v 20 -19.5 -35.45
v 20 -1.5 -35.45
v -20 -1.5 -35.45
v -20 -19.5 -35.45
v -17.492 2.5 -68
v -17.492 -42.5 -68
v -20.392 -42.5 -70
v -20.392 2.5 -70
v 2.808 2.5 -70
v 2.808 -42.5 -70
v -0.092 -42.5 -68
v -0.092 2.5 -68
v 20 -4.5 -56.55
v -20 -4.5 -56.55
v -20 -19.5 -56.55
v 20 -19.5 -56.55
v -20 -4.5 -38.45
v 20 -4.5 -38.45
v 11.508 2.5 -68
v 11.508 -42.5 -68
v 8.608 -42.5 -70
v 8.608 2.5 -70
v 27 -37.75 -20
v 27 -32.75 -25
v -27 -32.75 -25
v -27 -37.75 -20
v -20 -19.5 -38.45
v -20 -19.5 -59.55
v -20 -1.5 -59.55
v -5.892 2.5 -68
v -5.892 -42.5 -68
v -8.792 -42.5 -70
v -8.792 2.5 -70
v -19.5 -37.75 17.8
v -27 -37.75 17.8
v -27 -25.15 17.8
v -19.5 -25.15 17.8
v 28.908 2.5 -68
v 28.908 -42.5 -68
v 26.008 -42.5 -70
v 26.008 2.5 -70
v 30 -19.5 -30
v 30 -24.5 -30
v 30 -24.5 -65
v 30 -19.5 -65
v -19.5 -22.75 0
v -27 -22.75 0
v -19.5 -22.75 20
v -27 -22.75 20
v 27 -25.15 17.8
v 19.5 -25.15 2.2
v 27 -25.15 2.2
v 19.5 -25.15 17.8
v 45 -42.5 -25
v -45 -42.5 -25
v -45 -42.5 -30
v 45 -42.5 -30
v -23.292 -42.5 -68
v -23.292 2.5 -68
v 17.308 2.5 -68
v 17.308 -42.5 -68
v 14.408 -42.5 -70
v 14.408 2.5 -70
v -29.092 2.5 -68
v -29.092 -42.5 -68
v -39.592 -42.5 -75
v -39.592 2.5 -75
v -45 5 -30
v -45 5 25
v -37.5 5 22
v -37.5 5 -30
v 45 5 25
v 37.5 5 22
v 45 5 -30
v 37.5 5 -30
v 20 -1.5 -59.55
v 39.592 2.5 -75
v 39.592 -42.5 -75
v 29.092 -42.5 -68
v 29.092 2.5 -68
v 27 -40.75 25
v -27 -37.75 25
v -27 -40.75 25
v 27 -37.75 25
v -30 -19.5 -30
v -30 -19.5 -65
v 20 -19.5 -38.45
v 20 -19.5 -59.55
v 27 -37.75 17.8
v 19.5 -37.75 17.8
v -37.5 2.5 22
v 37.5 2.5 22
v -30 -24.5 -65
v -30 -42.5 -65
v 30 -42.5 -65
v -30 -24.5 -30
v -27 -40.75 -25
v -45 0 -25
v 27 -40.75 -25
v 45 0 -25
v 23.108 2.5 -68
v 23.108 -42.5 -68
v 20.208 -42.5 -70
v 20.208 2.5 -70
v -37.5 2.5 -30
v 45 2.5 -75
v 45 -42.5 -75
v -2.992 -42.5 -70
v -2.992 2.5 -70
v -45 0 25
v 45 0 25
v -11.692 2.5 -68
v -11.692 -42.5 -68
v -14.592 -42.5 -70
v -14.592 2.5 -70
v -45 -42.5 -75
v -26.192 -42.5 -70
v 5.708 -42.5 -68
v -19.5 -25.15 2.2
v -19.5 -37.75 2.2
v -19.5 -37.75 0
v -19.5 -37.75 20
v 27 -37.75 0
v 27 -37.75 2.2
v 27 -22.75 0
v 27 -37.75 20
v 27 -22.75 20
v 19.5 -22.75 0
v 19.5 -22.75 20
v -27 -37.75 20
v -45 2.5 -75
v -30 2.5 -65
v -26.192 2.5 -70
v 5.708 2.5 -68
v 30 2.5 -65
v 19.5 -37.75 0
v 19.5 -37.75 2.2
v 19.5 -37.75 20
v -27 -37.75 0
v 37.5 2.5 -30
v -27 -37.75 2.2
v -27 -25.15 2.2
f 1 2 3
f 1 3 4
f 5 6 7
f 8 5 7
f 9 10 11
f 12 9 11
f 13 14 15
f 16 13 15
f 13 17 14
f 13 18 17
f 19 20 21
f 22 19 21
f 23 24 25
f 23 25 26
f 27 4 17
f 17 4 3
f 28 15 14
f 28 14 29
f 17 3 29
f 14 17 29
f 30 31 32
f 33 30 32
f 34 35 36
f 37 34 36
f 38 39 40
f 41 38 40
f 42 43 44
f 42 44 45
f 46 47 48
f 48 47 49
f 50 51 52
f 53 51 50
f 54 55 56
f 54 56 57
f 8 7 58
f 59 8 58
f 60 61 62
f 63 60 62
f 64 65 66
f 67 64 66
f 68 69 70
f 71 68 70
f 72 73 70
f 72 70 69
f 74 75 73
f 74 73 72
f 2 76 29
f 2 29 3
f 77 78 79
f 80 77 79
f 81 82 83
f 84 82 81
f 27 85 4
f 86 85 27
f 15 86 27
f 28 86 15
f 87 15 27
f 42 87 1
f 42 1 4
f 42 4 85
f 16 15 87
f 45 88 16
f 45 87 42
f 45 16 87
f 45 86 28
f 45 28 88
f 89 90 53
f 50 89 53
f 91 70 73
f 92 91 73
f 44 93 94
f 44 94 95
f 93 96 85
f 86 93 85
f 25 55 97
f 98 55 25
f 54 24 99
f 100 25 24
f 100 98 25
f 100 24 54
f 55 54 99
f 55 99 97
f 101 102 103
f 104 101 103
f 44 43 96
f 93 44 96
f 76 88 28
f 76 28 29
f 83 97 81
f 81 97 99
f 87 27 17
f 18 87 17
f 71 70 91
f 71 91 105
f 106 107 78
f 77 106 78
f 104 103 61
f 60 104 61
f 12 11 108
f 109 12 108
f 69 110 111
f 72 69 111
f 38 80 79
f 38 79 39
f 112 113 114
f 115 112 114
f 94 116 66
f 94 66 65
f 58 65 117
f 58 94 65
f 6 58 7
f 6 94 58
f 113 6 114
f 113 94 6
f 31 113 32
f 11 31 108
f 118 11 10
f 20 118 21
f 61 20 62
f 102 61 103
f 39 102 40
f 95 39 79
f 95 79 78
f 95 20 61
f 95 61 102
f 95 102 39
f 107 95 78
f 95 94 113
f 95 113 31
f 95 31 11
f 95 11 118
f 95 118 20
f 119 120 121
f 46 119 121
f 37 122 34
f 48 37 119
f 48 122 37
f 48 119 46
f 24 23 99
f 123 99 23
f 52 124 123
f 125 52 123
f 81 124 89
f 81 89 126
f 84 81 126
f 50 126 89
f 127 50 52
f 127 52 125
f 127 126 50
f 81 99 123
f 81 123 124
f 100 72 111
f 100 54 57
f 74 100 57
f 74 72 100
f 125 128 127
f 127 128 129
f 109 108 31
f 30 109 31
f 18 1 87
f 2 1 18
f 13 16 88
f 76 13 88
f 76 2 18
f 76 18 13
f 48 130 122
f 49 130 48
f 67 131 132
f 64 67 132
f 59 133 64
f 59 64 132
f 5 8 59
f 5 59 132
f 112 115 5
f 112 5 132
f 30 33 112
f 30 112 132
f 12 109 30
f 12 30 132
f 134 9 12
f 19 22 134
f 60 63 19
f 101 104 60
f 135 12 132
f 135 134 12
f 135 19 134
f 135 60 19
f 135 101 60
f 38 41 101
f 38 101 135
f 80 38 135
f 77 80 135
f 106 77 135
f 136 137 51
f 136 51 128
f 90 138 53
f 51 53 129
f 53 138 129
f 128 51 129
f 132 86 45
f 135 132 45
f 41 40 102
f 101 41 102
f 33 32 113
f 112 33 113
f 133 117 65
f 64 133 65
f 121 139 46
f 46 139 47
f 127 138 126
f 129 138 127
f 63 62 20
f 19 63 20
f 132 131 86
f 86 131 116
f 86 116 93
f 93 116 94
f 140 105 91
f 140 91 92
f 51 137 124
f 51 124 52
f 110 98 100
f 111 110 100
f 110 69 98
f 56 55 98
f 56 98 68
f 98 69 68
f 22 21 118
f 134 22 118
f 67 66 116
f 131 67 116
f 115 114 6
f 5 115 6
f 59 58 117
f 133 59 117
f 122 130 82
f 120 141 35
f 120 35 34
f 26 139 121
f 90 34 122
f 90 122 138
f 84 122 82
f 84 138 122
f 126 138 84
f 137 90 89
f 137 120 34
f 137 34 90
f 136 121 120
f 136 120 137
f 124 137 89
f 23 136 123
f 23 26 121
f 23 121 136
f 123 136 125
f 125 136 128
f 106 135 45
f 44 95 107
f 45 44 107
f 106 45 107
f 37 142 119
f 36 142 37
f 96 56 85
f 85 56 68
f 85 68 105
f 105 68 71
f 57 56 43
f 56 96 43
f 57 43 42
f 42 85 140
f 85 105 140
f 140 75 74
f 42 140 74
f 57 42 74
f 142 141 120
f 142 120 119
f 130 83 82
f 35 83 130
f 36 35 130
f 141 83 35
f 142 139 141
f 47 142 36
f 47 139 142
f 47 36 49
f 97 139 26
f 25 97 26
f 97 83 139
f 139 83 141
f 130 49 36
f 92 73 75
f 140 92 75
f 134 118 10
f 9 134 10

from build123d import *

# Parameters (mm, degrees)
CROQUIS1_W                          = 90
CROQUIS1_H                          = 50
SALIENTE_EXTRUIR1_DEPTH             = 5
CROQUIS4_W                          = 90
CROQUIS4_H                          = 5
SALIENTE_EXTRUIR2_DEPTH             = 49.5
CROQUIS5_W                          = 60
CROQUIS5_H                          = 5
SALIENTE_EXTRUIR3_DEPTH             = 35
CROQUIS11_W                         = 75
CROQUIS11_H                         = 80
CORTAR_EXTRUIR3_DEPTH               = 2.5
SALIENTE_EXTRUIR4_REACH             = 27
SALIENTE_EXTRUIR4_DIRECTION_2_REACH = 26.5
CROQUIS13_W                         = 90
CROQUIS13_H                         = 5
CORTAR_EXTRUIR4_DEPTH               = 1
CROQUIS15_W                         = 54
CROQUIS15_H                         = 3
SALIENTE_EXTRUIR5_DEPTH             = 50
CROQUIS18_W                         = 90
CROQUIS18_H                         = 5
CORTAR_EXTRUIR5_DEPTH               = 1
SALIENTE_EXTRUIR6_REACH             = 47
SALIENTE_EXTRUIR6_DIRECTION_2_REACH = 47
SALIENTE_EXTRUIR7_DEPTH             = 20
CROQUIS24_W                         = 20
CROQUIS24_H                         = 15
SALIENTE_EXTRUIR8_DEPTH             = 54
CROQUIS25_W                         = 15.6
CROQUIS25_H                         = 12.6
CORTAR_EXTRUIR6_DEPTH               = 54
CROQUIS26_W                         = 39
CROQUIS26_H                         = 15
CORTAR_EXTRUIR7_DEPTH               = 20


with BuildPart() as part:
    # Croquis1 → Saliente-Extruir1 (new body)
    with BuildSketch(Plane(origin=(0, 0, 0), x_dir=(1, 0, 0), z_dir=(0, 1, 0))):
        Rectangle(CROQUIS1_W, CROQUIS1_H)
    extrude(amount=SALIENTE_EXTRUIR1_DEPTH)

    # Croquis4 → Saliente-Extruir2 (add)
    with BuildSketch(Plane(origin=(0, 5, 0), x_dir=(1, 0, 0), z_dir=(0, 1, 0))):
        with Locations((0, 27.5)):
            Rectangle(CROQUIS4_W, CROQUIS4_H)
    extrude(amount=-SALIENTE_EXTRUIR2_DEPTH)

    # Croquis5 → Saliente-Extruir3 (add)
    with BuildSketch(Plane(origin=(0, 0, -30), x_dir=(-1, 0, 0), z_dir=(0, 0, -1))):
        with Locations((0, -22)):
            Rectangle(CROQUIS5_W, CROQUIS5_H)
    extrude(amount=SALIENTE_EXTRUIR3_DEPTH)

    # Croquis11 → Cortar-Extruir3 (cut)
    with BuildSketch(Plane(origin=(0, 5, 0), x_dir=(1, 0, 0), z_dir=(0, 1, 0))):
        with Locations((0, 18)):
            Rectangle(CROQUIS11_W, CROQUIS11_H)
    extrude(amount=-CORTAR_EXTRUIR3_DEPTH, mode=Mode.SUBTRACT)

    # Saliente-Extruir4: up to this face of the body (flat: up to its plane)
    saliente_extruir4_end = Plane(part.part.faces().sort_by_distance((0, -44.5, -27.5))[0])
    # Croquis12 → Saliente-Extruir4 (add, up to the picked face)
    with BuildSketch(Plane(origin=(0, -19.5, 0), x_dir=(1, 0, 0), z_dir=(0, 1, 0)), mode=Mode.PRIVATE) as saliente_extruir4_sk1:
        Polygon((-39.591673087, 75), (-45, 75), (-30, 65), (30, 65), (45, 75), (39.591673087, 75), (29.091673087, 68), (28.908326913, 68), (26.008326913, 70), (23.108326913, 68), (20.208326913, 70), (17.308326913, 68), (14.408326913, 70), (11.508326913, 68), (8.608326913, 70), (5.708326913, 68), (2.808326913, 70), (-0.091673087, 68), (-2.991673087, 70), (-5.891673087, 68), (-8.791673087, 70), (-11.691673087, 68), (-14.591673087, 70), (-17.491673087, 68), (-20.391673087, 70), (-23.291673087, 68), (-26.191673087, 70), (-29.091673087, 68), align=None)
    saliente_extruir4_tool1 = split(extrude(saliente_extruir4_sk1.sketch, amount=-SALIENTE_EXTRUIR4_REACH, mode=Mode.PRIVATE), bisect_by=saliente_extruir4_end, keep=Keep.BOTH, mode=Mode.PRIVATE)
    add(saliente_extruir4_tool1.solids().sort_by_distance((-27.127569, -19.5, -68.254549))[0])

    # Saliente-Extruir4 direction 2: up to this face of the body (flat: up to its plane)
    saliente_extruir4_direction_2_end = Plane(part.part.faces().sort_by_distance((0, 2.5, -4))[0])
    # Croquis12 → Saliente-Extruir4 direction 2 (add, up to the picked face)
    with BuildSketch(Plane(origin=(0, -19.5, 0), x_dir=(1, 0, 0), z_dir=(0, 1, 0)), mode=Mode.PRIVATE) as saliente_extruir4_direction_2_sk1:
        Polygon((-39.591673087, 75), (-45, 75), (-30, 65), (30, 65), (45, 75), (39.591673087, 75), (29.091673087, 68), (28.908326913, 68), (26.008326913, 70), (23.108326913, 68), (20.208326913, 70), (17.308326913, 68), (14.408326913, 70), (11.508326913, 68), (8.608326913, 70), (5.708326913, 68), (2.808326913, 70), (-0.091673087, 68), (-2.991673087, 70), (-5.891673087, 68), (-8.791673087, 70), (-11.691673087, 68), (-14.591673087, 70), (-17.491673087, 68), (-20.391673087, 70), (-23.291673087, 68), (-26.191673087, 70), (-29.091673087, 68), align=None)
    saliente_extruir4_direction_2_tool1 = split(extrude(saliente_extruir4_direction_2_sk1.sketch, amount=SALIENTE_EXTRUIR4_DIRECTION_2_REACH, mode=Mode.PRIVATE), bisect_by=saliente_extruir4_direction_2_end, keep=Keep.BOTH, mode=Mode.PRIVATE)
    add(saliente_extruir4_direction_2_tool1.solids().sort_by_distance((-27.127569, -19.5, -68.254549))[0])

    # Croquis13 → Cortar-Extruir4 (cut)
    with BuildSketch(Plane.XZ.offset(44.5)):
        with Locations((0, -27.5)):
            Rectangle(CROQUIS13_W, CROQUIS13_H)
        Polygon((-39.591673087, -75), (-29.091673087, -68), (-26.191673087, -70), (-23.291673087, -68), (-20.391673087, -70), (-17.491673087, -68), (-14.591673087, -70), (-11.691673087, -68), (-8.791673087, -70), (-5.891673087, -68), (-2.991673087, -70), (-0.091673087, -68), (2.808326913, -70), (5.708326913, -68), (8.608326913, -70), (11.508326913, -68), (14.408326913, -70), (17.308326913, -68), (20.208326913, -70), (23.108326913, -68), (26.008326913, -70), (28.908326913, -68), (29.091673087, -68), (39.591673087, -75), (45, -75), (30, -65), (-30, -65), (-45, -75), align=None)
    extrude(amount=-CORTAR_EXTRUIR4_DEPTH, mode=Mode.SUBTRACT)

    # Croquis15 → Saliente-Extruir5 (add)
    with BuildSketch(Plane.XY.offset(-25)):
        with Locations((0, -39.25)):
            Rectangle(CROQUIS15_W, CROQUIS15_H)
    extrude(amount=SALIENTE_EXTRUIR5_DEPTH)

    # Croquis18 → Cortar-Extruir5 (cut)
    with BuildSketch(Plane.XZ.offset(43.5)):
        with Locations((0, -27.5)):
            Rectangle(CROQUIS18_W, CROQUIS18_H)
        Polygon((-45, -75), (-39.591673087, -75), (-29.091673087, -68), (-26.191673087, -70), (-23.291673087, -68), (-20.391673087, -70), (-17.491673087, -68), (-14.591673087, -70), (-11.691673087, -68), (-8.791673087, -70), (-5.891673087, -68), (-2.991673087, -70), (-0.091673087, -68), (2.808326913, -70), (5.708326913, -68), (8.608326913, -70), (11.508326913, -68), (14.408326913, -70), (17.308326913, -68), (20.208326913, -70), (23.108326913, -68), (26.008326913, -70), (28.908326913, -68), (29.091673087, -68), (39.591673087, -75), (45, -75), (30, -65), (-30, -65), align=None)
    extrude(amount=-CORTAR_EXTRUIR5_DEPTH, mode=Mode.SUBTRACT)

    # Saliente-Extruir6: up to this face of the body (flat: up to its plane)
    saliente_extruir6_end = Plane(part.part.faces().sort_by_distance((-27, -39.25, 0))[0])
    # Croquis22 → Saliente-Extruir6 (add, up to the picked face)
    with BuildSketch(Plane(origin=(0, 0, 0), x_dir=(0, 0, -1), z_dir=(1, 0, 0)), mode=Mode.PRIVATE) as saliente_extruir6_sk1:
        Polygon((25, -37.75), (25, -32.75), (20, -37.75), align=None)
    saliente_extruir6_tool1 = split(extrude(saliente_extruir6_sk1.sketch, amount=-SALIENTE_EXTRUIR6_REACH, mode=Mode.PRIVATE), bisect_by=saliente_extruir6_end, keep=Keep.BOTH, mode=Mode.PRIVATE)
    add(saliente_extruir6_tool1.solids().sort_by_distance((0, -36.083333, -23.333333))[0])

    # Saliente-Extruir6 direction 2: up to this face of the body (flat: up to its plane)
    saliente_extruir6_direction_2_end = Plane(part.part.faces().sort_by_distance((27, -39.25, 0))[0])
    # Croquis22 → Saliente-Extruir6 direction 2 (add, up to the picked face)
    with BuildSketch(Plane(origin=(0, 0, 0), x_dir=(0, 0, -1), z_dir=(1, 0, 0)), mode=Mode.PRIVATE) as saliente_extruir6_direction_2_sk1:
        Polygon((25, -37.75), (25, -32.75), (20, -37.75), align=None)
    saliente_extruir6_direction_2_tool1 = split(extrude(saliente_extruir6_direction_2_sk1.sketch, amount=SALIENTE_EXTRUIR6_DIRECTION_2_REACH, mode=Mode.PRIVATE), bisect_by=saliente_extruir6_direction_2_end, keep=Keep.BOTH, mode=Mode.PRIVATE)
    add(saliente_extruir6_direction_2_tool1.solids().sort_by_distance((0, -36.083333, -23.333333))[0])

    # Croquis23 → Saliente-Extruir7 (add, symmetric)
    with BuildSketch(Plane(origin=(0, 0, 0), x_dir=(0, 0, -1), z_dir=(1, 0, 0))):
        Polygon((38.45, -4.5), (56.55, -4.5), (56.55, -19.5), (59.55, -19.5), (59.55, -1.5), (35.45, -1.5), (35.45, -19.5), (38.45, -19.5), align=None)
    extrude(amount=SALIENTE_EXTRUIR7_DEPTH, both=True)

    # Croquis24 → Saliente-Extruir8 (add)
    with BuildSketch(Plane.ZY.offset(27)):
        with Locations((10, -30.25)):
            Rectangle(CROQUIS24_W, CROQUIS24_H)
    extrude(amount=-SALIENTE_EXTRUIR8_DEPTH)

    # Croquis25 → Cortar-Extruir6 (cut)
    with BuildSketch(Plane.ZY.offset(27)):
        with Locations((10, -31.45)):
            Rectangle(CROQUIS25_W, CROQUIS25_H)
    extrude(amount=-CORTAR_EXTRUIR6_DEPTH, mode=Mode.SUBTRACT)

    # Croquis26 → Cortar-Extruir7 (cut)
    with BuildSketch(Plane.XY.offset(20)):
        with Locations((0, -30.25)):
            Rectangle(CROQUIS26_W, CROQUIS26_H)
    extrude(amount=-CORTAR_EXTRUIR7_DEPTH, mode=Mode.SUBTRACT)


solid = part.part
